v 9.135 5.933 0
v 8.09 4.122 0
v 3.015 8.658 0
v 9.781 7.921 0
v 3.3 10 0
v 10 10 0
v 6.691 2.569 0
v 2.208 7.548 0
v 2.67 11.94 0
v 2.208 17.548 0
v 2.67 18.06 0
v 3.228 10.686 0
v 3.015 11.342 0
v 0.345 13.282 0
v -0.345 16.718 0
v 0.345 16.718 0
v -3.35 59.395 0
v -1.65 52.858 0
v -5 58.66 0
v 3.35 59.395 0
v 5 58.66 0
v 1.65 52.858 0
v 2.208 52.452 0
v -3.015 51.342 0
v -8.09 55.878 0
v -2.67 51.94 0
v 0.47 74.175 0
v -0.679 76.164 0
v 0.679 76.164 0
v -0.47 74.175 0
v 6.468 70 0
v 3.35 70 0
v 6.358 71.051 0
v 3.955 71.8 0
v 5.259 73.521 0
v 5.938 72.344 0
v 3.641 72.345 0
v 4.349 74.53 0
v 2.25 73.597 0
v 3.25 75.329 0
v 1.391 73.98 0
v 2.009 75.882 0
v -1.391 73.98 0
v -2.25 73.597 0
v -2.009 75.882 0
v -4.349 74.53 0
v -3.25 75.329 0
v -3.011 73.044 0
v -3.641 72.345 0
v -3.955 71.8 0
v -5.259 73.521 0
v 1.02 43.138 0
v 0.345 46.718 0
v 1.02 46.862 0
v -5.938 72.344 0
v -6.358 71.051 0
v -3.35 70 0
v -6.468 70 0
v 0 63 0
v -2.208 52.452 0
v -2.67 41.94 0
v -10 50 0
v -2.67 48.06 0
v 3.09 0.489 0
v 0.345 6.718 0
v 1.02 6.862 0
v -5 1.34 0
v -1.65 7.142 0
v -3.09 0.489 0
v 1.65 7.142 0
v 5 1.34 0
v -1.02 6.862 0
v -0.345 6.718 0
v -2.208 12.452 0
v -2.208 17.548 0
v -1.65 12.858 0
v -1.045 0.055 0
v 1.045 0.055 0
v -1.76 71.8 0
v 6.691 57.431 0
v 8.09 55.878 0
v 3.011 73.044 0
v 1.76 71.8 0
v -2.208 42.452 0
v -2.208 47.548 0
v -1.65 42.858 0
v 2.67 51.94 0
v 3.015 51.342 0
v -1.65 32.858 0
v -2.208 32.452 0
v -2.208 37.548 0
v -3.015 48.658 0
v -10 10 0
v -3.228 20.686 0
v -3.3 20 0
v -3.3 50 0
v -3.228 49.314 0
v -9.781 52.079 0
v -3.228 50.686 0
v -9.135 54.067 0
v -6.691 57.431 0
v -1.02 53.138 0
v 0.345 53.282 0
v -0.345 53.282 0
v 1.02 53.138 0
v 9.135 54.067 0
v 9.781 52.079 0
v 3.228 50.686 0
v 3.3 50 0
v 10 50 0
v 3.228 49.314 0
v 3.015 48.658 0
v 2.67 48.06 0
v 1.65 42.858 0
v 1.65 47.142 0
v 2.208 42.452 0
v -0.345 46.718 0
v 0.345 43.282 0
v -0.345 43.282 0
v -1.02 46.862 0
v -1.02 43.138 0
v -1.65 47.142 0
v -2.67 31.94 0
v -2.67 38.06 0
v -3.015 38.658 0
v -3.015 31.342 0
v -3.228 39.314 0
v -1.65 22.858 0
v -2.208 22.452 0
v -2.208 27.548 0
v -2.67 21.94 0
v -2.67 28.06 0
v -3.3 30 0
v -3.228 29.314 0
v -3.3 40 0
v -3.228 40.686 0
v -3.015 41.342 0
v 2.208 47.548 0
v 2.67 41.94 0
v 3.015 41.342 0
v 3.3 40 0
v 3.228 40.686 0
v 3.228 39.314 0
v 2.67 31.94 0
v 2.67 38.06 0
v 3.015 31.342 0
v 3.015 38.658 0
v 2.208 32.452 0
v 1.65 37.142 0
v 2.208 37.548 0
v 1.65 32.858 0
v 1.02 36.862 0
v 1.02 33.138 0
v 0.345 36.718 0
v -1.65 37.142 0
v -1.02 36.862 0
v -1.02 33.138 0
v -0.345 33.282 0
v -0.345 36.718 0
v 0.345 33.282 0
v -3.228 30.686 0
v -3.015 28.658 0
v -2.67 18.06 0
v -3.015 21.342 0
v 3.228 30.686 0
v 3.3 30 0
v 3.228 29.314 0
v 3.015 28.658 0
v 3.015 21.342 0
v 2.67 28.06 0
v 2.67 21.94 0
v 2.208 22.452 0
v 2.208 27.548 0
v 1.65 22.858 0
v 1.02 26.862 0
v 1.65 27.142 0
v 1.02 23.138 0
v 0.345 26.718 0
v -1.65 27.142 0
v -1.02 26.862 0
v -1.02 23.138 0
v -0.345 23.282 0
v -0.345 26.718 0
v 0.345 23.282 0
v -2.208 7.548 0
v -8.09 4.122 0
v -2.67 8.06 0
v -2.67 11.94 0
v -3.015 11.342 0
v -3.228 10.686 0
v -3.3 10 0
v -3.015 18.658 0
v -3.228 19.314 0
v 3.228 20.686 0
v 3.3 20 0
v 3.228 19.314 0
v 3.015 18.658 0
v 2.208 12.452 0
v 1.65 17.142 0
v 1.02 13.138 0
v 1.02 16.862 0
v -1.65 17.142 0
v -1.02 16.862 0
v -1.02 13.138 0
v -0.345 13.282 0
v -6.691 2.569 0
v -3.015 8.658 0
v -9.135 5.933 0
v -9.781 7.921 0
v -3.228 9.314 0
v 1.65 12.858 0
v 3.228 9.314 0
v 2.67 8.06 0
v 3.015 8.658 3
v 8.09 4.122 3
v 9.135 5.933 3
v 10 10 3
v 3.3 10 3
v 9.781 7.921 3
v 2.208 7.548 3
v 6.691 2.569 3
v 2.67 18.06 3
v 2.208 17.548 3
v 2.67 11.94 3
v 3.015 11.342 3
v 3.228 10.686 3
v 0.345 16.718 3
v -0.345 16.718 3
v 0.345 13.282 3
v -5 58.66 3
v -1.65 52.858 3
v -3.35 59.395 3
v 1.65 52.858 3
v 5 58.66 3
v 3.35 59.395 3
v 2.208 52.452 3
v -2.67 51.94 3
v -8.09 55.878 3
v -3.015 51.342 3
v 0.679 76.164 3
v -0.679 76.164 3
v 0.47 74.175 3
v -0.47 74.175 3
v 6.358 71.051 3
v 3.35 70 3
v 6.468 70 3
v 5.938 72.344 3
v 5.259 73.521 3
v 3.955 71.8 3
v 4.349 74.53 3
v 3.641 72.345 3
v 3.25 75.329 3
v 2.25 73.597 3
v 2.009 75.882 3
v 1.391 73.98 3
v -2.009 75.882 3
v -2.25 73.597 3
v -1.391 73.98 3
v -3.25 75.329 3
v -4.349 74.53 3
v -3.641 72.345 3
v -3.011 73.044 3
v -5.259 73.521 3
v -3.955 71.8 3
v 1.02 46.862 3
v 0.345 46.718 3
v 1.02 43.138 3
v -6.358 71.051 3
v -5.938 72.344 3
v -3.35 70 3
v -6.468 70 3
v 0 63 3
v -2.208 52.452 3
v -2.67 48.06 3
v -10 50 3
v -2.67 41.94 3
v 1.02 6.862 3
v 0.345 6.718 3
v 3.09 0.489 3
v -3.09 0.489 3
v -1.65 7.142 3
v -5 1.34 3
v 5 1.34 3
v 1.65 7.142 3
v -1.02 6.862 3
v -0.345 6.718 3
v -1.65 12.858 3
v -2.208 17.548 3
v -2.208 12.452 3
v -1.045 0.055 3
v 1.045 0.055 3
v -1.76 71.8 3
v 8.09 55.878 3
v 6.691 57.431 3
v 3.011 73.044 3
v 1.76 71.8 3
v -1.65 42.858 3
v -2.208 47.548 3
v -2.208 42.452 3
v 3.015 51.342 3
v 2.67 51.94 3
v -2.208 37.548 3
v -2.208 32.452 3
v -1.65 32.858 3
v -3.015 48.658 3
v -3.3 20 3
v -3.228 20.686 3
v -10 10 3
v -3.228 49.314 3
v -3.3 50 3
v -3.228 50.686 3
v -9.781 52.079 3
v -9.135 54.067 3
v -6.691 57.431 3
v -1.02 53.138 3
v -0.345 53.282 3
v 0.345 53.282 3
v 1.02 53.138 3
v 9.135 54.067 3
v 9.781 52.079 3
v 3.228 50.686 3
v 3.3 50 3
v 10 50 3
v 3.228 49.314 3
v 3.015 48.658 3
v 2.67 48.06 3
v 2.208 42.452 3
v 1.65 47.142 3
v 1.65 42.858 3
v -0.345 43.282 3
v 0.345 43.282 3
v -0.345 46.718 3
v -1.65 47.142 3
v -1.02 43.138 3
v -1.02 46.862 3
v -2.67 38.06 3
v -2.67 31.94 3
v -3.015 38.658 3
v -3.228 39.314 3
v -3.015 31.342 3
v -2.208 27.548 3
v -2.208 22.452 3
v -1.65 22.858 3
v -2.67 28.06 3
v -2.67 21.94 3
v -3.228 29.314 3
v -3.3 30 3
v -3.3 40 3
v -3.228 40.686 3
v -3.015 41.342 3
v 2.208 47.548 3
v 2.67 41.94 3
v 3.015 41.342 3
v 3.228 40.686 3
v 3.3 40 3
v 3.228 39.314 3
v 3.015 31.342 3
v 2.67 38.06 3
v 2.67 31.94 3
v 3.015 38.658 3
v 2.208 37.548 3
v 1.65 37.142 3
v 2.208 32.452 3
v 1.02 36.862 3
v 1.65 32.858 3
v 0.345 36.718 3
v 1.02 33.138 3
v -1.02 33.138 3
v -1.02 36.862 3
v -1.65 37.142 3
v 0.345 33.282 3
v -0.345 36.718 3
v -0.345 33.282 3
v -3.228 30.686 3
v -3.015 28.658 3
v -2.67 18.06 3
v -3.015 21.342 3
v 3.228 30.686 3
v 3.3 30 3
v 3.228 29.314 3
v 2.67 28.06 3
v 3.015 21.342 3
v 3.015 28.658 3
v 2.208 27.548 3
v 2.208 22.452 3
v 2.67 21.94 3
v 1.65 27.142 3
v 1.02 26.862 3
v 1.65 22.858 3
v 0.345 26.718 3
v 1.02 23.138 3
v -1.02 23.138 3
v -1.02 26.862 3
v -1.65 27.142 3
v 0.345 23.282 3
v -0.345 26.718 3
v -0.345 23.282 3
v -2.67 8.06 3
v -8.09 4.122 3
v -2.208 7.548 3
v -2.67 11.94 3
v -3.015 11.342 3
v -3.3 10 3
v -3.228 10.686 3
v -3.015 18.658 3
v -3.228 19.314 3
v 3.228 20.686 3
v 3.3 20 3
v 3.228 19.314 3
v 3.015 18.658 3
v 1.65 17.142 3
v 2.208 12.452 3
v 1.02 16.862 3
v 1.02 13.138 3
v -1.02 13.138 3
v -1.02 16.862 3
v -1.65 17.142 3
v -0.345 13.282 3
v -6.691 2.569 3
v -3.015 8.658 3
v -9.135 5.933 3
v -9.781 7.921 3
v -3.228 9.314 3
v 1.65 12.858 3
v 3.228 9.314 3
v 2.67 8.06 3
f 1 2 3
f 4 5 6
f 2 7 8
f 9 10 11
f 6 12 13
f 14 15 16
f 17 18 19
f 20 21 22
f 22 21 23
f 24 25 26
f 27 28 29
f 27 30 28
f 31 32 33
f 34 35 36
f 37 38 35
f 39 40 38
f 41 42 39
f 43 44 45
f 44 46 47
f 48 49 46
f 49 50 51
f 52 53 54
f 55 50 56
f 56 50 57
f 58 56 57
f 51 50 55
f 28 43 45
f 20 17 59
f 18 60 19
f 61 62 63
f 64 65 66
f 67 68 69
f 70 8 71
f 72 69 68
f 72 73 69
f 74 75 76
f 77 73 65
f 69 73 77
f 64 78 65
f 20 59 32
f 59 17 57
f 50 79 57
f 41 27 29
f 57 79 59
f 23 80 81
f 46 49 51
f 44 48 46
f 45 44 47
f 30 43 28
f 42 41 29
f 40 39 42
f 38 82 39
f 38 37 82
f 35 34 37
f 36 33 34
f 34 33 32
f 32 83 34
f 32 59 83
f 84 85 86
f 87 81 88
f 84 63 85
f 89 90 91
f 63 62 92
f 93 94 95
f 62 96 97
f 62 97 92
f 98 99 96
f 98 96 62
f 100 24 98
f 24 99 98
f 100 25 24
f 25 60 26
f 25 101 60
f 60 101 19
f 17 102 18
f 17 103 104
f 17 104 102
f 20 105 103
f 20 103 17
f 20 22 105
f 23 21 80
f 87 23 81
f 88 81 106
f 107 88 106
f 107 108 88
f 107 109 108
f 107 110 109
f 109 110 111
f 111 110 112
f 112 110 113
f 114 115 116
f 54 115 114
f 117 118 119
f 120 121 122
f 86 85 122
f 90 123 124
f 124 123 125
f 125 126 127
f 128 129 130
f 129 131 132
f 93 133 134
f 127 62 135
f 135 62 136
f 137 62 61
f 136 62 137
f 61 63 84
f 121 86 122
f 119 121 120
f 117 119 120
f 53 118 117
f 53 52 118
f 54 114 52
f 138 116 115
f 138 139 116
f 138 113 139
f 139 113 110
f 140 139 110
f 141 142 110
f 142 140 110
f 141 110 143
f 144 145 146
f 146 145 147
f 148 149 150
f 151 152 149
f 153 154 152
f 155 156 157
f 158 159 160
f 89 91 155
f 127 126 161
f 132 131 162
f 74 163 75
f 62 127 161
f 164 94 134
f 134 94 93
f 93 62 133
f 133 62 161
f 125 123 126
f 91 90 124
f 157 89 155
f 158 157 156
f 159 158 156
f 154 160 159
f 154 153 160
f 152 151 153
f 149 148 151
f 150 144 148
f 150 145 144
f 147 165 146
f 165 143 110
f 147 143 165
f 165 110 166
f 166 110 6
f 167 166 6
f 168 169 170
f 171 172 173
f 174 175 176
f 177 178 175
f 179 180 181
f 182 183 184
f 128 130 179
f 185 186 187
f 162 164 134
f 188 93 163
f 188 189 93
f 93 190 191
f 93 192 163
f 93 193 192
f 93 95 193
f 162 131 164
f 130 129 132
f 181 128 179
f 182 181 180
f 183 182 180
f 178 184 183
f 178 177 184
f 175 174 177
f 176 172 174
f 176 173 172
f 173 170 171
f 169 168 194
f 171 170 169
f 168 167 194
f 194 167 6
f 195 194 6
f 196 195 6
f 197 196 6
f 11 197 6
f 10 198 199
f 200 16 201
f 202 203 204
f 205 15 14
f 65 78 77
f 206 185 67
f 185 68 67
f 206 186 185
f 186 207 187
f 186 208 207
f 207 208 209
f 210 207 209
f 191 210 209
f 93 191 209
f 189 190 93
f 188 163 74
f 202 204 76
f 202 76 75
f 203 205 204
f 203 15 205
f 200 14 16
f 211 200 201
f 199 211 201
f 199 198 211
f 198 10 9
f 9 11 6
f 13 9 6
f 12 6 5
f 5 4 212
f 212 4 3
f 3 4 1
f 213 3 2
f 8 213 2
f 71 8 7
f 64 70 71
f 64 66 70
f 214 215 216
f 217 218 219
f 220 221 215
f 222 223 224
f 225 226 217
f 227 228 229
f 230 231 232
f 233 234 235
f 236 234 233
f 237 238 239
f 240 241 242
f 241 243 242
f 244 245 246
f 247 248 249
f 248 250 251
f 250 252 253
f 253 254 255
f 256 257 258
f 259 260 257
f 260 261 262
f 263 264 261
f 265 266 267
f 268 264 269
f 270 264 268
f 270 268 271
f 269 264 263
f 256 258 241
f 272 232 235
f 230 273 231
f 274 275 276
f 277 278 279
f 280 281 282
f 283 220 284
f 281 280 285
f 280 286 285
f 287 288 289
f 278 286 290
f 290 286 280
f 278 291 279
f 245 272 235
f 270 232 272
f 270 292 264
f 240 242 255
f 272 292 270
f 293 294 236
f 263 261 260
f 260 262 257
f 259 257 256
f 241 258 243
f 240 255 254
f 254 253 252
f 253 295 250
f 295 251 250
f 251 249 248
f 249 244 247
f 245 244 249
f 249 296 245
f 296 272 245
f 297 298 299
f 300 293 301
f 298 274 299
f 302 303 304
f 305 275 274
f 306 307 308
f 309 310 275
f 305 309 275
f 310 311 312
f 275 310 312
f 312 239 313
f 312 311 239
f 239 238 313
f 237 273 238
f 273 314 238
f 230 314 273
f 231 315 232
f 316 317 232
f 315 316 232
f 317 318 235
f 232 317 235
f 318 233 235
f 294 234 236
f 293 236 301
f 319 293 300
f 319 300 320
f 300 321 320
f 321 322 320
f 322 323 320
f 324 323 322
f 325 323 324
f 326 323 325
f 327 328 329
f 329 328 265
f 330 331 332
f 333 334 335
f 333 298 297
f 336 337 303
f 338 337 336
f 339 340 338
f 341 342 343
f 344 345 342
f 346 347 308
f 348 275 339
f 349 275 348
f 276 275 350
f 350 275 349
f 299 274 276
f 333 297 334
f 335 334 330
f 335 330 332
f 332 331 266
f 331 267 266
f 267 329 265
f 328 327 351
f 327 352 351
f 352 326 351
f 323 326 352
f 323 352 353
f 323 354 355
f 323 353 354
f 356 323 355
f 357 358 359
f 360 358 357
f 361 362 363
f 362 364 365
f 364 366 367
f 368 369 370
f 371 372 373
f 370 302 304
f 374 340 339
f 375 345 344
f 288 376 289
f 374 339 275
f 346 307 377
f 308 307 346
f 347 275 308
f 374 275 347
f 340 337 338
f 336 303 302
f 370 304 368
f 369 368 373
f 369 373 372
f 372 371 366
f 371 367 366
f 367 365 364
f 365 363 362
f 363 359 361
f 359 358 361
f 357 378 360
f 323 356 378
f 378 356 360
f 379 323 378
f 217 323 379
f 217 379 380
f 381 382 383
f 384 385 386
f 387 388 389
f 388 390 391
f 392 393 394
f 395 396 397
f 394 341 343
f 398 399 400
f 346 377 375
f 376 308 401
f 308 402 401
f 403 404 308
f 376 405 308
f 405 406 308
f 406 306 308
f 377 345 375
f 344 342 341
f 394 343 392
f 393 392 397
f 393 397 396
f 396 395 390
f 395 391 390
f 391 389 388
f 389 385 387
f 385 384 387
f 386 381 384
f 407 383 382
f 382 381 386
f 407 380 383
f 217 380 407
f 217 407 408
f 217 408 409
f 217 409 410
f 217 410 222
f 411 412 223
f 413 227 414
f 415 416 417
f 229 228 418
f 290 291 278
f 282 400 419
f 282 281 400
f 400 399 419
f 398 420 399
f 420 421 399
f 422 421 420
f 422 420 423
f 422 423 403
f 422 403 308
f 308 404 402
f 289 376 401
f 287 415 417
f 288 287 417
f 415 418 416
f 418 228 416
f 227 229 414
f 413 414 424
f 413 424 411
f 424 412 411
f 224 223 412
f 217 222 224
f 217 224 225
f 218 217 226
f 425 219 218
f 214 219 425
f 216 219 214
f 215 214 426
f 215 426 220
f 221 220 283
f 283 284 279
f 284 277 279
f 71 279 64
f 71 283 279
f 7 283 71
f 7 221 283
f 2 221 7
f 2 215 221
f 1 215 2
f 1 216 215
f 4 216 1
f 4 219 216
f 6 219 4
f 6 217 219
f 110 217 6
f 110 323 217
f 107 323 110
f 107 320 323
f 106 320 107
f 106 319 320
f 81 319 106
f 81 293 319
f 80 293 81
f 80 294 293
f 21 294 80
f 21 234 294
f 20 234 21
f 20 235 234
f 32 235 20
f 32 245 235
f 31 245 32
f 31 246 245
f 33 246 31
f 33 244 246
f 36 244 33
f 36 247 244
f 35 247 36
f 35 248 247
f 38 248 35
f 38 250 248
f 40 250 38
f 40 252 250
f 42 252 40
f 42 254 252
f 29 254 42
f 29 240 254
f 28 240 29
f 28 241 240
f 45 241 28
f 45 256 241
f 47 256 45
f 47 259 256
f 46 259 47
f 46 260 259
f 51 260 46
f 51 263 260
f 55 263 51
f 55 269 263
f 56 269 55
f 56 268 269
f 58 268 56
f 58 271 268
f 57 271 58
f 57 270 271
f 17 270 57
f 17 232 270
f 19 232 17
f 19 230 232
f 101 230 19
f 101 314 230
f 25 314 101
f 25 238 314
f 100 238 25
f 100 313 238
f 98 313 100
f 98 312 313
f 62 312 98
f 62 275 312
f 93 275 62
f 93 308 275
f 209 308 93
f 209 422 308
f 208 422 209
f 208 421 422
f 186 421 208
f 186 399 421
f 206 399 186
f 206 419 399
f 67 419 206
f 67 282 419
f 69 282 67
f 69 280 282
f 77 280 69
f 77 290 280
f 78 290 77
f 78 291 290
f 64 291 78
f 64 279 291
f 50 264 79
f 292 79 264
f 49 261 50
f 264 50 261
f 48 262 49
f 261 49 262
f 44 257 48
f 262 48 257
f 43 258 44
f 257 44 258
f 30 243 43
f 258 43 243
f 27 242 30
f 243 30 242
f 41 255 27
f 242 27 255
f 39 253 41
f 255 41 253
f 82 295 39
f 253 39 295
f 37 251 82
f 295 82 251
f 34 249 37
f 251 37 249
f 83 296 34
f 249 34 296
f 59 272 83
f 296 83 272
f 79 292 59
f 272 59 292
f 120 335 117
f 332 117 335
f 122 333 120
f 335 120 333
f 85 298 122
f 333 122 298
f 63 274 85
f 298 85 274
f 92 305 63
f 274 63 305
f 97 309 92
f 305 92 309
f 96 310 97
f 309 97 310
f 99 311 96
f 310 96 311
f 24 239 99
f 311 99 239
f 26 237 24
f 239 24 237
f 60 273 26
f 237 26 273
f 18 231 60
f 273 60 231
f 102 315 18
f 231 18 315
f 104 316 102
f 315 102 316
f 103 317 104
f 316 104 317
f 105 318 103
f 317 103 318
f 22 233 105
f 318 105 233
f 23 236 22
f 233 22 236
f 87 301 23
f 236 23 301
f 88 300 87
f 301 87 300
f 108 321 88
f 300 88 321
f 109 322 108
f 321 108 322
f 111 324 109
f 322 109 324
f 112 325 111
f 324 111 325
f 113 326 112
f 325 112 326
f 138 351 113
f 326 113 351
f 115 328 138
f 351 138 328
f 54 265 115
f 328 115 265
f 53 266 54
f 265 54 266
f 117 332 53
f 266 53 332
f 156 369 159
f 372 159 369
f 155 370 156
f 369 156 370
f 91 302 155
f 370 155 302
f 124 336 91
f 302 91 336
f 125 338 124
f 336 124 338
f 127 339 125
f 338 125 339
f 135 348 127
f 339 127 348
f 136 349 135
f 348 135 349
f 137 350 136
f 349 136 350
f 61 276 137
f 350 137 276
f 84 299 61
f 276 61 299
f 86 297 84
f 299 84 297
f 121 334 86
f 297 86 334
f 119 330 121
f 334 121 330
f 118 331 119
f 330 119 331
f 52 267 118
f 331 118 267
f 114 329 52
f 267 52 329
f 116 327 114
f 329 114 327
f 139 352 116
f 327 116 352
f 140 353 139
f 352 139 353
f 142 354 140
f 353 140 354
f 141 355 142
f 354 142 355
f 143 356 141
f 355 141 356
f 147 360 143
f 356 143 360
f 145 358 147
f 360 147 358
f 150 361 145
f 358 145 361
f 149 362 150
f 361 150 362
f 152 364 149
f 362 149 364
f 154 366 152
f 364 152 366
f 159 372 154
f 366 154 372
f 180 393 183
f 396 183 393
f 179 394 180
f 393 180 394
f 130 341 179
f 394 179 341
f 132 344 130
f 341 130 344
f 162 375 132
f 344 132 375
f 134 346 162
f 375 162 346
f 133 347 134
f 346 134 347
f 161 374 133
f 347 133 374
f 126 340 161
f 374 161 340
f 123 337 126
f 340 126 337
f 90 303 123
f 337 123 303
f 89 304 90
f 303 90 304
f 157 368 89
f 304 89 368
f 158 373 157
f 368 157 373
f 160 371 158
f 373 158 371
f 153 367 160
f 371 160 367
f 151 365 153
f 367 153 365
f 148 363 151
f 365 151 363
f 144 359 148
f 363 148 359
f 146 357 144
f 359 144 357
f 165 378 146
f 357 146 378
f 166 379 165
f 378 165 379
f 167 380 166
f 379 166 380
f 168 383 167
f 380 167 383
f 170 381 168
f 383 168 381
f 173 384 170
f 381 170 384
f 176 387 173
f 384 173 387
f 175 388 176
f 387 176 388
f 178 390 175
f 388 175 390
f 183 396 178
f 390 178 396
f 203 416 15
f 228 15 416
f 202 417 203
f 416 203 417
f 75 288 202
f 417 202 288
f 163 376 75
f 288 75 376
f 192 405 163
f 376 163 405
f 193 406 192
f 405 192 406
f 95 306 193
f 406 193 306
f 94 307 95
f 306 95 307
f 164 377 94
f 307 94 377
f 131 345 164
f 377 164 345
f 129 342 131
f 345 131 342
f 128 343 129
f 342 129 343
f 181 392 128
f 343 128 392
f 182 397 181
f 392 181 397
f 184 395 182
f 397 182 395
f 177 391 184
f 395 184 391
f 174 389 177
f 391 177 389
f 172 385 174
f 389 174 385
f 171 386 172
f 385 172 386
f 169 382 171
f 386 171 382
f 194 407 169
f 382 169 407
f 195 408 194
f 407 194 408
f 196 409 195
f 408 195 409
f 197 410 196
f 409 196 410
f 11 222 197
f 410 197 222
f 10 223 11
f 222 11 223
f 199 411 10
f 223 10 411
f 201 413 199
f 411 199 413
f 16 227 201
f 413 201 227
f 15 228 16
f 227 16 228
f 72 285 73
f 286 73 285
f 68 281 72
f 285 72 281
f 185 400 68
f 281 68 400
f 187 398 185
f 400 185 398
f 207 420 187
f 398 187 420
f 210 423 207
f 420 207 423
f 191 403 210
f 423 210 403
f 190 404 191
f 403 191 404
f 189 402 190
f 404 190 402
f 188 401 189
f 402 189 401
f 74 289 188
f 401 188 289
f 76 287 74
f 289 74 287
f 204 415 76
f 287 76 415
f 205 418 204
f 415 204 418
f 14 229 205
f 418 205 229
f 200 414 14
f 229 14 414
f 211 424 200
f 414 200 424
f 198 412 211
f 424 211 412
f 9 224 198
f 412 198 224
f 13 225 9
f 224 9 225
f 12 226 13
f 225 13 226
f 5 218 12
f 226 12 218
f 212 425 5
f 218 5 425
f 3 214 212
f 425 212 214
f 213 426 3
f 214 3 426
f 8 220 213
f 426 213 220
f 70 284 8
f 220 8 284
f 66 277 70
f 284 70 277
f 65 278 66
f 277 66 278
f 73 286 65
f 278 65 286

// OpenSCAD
$fn=30;

holes = 5;
pitch = 10;

module body_outline()
{
	translate([0, pitch, 0])
	difference()
	{
		hull()
		{
			circle(10);
		
			translate([0, pitch * (holes - 1), 0]) circle(10);
		}
		
		for (i = [0:holes-1])
			translate([0, i * pitch, 0]) circle(3.3);
			
	}
}

module head_outline()
{
	neck_length = 10;
	head_rad = 6.5;

	module neck() translate([0, -neck_length / 2 - 1, 0]) square([6.7, neck_length + 2], center=true);

	module head_inner()
	{
		difference()
		{
			translate([0, 6.2 - head_rad, 0]) circle(head_rad - 2);
			translate([0, -neck_length / 2 + 1.8, 0]) square([20, 10], center=true);
		}
	}
	
	translate([0, pitch * (holes + 1) + neck_length, 0]) // Top of neck.
	difference()
	{
		union()
		{
			neck();

			difference()
			{
				translate([0, 6.2 - head_rad, 0]) circle(head_rad);
				translate([0, -neck_length / 2, 0]) square([20, 10], center=true);

				head_inner();
			}
		}

		polygon([[-2, 3], [2, 3], [0, -7]]);
	}
}

linear_extrude(height = 3)
union()
{
	body_outline();
	head_outline();
}
